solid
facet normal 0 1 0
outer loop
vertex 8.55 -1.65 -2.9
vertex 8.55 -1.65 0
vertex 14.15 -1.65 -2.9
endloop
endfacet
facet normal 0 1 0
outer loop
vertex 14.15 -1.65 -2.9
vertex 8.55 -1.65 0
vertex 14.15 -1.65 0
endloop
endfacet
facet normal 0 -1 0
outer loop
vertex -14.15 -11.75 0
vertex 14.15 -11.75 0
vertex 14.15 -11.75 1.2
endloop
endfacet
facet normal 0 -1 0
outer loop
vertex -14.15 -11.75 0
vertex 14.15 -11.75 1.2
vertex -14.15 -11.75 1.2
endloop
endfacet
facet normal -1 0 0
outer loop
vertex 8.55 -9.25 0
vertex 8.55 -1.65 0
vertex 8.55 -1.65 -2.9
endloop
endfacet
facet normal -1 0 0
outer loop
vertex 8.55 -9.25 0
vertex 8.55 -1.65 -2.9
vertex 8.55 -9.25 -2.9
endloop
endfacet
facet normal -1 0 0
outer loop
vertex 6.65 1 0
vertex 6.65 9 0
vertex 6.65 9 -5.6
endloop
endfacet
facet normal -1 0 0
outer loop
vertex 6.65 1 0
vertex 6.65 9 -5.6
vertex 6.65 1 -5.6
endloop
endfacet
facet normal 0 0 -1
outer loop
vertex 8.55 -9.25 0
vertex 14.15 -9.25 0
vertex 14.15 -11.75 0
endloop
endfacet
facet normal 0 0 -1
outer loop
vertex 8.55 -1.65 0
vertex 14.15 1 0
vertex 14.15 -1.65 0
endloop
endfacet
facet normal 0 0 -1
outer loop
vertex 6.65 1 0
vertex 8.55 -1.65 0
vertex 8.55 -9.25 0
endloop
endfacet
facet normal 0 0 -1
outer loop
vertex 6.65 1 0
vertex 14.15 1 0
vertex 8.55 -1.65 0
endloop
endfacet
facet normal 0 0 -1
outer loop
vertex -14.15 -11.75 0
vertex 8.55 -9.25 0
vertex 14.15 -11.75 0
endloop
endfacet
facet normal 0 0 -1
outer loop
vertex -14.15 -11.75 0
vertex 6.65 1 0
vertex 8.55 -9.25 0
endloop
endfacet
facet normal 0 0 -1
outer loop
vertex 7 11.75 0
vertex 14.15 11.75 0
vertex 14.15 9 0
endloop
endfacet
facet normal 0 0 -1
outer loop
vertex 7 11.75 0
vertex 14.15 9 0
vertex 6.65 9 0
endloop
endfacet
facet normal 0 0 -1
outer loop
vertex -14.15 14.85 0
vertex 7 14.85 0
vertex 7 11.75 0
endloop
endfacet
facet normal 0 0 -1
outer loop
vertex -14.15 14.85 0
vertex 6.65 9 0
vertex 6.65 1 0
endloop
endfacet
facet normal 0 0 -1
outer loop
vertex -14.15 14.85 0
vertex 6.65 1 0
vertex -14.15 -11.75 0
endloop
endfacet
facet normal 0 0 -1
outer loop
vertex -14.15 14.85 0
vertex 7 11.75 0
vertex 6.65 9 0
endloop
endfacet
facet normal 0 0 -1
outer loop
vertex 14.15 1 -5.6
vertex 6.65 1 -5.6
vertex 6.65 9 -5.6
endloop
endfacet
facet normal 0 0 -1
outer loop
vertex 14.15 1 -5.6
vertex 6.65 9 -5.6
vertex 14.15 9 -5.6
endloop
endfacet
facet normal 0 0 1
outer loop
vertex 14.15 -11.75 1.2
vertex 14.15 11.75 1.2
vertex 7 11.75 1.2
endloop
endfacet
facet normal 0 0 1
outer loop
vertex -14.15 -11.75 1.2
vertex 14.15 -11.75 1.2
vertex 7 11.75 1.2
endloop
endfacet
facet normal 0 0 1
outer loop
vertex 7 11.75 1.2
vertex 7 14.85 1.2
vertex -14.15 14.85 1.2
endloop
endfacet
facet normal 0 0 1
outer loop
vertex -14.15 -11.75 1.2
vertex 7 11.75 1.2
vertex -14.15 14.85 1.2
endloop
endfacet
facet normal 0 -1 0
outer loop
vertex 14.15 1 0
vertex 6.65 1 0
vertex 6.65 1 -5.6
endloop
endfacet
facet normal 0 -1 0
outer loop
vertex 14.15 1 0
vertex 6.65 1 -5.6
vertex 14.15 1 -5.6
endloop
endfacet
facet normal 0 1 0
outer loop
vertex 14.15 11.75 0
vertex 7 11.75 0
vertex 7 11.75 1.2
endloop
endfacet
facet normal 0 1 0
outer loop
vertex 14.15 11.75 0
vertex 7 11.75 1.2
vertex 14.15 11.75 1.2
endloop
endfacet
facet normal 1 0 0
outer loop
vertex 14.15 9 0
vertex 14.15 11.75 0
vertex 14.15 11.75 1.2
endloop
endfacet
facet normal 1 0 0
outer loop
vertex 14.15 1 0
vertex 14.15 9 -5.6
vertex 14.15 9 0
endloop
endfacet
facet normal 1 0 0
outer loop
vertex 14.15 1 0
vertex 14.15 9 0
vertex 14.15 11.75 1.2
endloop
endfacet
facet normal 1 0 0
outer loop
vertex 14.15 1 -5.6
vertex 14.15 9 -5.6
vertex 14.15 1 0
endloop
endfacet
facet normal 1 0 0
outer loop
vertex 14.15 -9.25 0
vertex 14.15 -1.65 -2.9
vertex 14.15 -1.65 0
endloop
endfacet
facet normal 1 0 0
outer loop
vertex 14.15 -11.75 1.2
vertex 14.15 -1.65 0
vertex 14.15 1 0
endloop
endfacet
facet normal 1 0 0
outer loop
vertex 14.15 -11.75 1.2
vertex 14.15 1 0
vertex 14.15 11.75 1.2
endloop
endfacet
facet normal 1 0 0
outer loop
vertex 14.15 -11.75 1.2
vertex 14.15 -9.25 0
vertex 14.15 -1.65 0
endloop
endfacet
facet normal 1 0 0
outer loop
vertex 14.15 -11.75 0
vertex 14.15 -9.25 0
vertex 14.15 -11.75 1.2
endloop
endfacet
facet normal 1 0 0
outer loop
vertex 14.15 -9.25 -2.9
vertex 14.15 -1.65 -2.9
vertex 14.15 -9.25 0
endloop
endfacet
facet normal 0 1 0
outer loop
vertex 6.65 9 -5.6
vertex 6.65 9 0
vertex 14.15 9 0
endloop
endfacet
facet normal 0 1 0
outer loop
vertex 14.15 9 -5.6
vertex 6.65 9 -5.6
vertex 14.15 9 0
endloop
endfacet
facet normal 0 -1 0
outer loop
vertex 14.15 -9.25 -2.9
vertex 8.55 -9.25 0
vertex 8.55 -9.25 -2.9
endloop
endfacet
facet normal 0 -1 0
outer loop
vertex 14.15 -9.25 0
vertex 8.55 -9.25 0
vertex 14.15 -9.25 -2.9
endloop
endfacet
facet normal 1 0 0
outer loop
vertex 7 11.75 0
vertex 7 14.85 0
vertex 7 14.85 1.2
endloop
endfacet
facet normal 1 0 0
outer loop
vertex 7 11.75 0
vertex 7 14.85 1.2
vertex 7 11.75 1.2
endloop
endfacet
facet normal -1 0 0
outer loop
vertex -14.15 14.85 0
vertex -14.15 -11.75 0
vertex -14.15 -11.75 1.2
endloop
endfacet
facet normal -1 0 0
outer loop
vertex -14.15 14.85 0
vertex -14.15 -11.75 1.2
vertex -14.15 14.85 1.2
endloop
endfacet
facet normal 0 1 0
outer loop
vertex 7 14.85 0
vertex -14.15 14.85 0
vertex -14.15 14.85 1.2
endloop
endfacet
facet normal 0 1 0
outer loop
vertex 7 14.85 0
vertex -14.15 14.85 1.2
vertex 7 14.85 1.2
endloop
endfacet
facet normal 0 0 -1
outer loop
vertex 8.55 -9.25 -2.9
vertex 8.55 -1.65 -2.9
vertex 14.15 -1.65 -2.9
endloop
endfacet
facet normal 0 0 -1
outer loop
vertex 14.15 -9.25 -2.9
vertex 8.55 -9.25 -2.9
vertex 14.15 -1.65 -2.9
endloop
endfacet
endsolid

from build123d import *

# Parameters (mm, degrees)
PAD004_DEPTH = 1.2
SKETCH006_W  = 7.5
SKETCH006_H  = 8
PAD005_DEPTH = 5.6
SKETCH007_W  = 5.6
SKETCH007_H  = 7.6
PAD006_DEPTH = 2.9


with BuildPart() as part:
    # Sketch005 → Pad004 (new body)
    with BuildSketch(Plane.XY):
        Polygon((7, 11.75), (14.15, 11.75), (14.15, -11.75), (-14.15, -11.75), (-14.15, 14.85), (7, 14.85), align=None)
    extrude(amount=PAD004_DEPTH)

    # Sketch006 (on Face7 of Pad004) → Pad005 (join)
    with BuildSketch(Plane(origin=(0, 0, 0), x_dir=(1, 0, 0), z_dir=(0, 0, -1))):
        with Locations((10.4, -5)):
            Rectangle(SKETCH006_W, SKETCH006_H)
    extrude(amount=PAD005_DEPTH)

    # Sketch007 (on Face4 of Pad005) → Pad006 (join)
    with BuildSketch(Plane(origin=(0, 0, 0), x_dir=(1, 0, 0), z_dir=(0, 0, -1))):
        with Locations((11.35, 5.45)):
            Rectangle(SKETCH007_W, SKETCH007_H)
    extrude(amount=PAD006_DEPTH)


solid = part.part
